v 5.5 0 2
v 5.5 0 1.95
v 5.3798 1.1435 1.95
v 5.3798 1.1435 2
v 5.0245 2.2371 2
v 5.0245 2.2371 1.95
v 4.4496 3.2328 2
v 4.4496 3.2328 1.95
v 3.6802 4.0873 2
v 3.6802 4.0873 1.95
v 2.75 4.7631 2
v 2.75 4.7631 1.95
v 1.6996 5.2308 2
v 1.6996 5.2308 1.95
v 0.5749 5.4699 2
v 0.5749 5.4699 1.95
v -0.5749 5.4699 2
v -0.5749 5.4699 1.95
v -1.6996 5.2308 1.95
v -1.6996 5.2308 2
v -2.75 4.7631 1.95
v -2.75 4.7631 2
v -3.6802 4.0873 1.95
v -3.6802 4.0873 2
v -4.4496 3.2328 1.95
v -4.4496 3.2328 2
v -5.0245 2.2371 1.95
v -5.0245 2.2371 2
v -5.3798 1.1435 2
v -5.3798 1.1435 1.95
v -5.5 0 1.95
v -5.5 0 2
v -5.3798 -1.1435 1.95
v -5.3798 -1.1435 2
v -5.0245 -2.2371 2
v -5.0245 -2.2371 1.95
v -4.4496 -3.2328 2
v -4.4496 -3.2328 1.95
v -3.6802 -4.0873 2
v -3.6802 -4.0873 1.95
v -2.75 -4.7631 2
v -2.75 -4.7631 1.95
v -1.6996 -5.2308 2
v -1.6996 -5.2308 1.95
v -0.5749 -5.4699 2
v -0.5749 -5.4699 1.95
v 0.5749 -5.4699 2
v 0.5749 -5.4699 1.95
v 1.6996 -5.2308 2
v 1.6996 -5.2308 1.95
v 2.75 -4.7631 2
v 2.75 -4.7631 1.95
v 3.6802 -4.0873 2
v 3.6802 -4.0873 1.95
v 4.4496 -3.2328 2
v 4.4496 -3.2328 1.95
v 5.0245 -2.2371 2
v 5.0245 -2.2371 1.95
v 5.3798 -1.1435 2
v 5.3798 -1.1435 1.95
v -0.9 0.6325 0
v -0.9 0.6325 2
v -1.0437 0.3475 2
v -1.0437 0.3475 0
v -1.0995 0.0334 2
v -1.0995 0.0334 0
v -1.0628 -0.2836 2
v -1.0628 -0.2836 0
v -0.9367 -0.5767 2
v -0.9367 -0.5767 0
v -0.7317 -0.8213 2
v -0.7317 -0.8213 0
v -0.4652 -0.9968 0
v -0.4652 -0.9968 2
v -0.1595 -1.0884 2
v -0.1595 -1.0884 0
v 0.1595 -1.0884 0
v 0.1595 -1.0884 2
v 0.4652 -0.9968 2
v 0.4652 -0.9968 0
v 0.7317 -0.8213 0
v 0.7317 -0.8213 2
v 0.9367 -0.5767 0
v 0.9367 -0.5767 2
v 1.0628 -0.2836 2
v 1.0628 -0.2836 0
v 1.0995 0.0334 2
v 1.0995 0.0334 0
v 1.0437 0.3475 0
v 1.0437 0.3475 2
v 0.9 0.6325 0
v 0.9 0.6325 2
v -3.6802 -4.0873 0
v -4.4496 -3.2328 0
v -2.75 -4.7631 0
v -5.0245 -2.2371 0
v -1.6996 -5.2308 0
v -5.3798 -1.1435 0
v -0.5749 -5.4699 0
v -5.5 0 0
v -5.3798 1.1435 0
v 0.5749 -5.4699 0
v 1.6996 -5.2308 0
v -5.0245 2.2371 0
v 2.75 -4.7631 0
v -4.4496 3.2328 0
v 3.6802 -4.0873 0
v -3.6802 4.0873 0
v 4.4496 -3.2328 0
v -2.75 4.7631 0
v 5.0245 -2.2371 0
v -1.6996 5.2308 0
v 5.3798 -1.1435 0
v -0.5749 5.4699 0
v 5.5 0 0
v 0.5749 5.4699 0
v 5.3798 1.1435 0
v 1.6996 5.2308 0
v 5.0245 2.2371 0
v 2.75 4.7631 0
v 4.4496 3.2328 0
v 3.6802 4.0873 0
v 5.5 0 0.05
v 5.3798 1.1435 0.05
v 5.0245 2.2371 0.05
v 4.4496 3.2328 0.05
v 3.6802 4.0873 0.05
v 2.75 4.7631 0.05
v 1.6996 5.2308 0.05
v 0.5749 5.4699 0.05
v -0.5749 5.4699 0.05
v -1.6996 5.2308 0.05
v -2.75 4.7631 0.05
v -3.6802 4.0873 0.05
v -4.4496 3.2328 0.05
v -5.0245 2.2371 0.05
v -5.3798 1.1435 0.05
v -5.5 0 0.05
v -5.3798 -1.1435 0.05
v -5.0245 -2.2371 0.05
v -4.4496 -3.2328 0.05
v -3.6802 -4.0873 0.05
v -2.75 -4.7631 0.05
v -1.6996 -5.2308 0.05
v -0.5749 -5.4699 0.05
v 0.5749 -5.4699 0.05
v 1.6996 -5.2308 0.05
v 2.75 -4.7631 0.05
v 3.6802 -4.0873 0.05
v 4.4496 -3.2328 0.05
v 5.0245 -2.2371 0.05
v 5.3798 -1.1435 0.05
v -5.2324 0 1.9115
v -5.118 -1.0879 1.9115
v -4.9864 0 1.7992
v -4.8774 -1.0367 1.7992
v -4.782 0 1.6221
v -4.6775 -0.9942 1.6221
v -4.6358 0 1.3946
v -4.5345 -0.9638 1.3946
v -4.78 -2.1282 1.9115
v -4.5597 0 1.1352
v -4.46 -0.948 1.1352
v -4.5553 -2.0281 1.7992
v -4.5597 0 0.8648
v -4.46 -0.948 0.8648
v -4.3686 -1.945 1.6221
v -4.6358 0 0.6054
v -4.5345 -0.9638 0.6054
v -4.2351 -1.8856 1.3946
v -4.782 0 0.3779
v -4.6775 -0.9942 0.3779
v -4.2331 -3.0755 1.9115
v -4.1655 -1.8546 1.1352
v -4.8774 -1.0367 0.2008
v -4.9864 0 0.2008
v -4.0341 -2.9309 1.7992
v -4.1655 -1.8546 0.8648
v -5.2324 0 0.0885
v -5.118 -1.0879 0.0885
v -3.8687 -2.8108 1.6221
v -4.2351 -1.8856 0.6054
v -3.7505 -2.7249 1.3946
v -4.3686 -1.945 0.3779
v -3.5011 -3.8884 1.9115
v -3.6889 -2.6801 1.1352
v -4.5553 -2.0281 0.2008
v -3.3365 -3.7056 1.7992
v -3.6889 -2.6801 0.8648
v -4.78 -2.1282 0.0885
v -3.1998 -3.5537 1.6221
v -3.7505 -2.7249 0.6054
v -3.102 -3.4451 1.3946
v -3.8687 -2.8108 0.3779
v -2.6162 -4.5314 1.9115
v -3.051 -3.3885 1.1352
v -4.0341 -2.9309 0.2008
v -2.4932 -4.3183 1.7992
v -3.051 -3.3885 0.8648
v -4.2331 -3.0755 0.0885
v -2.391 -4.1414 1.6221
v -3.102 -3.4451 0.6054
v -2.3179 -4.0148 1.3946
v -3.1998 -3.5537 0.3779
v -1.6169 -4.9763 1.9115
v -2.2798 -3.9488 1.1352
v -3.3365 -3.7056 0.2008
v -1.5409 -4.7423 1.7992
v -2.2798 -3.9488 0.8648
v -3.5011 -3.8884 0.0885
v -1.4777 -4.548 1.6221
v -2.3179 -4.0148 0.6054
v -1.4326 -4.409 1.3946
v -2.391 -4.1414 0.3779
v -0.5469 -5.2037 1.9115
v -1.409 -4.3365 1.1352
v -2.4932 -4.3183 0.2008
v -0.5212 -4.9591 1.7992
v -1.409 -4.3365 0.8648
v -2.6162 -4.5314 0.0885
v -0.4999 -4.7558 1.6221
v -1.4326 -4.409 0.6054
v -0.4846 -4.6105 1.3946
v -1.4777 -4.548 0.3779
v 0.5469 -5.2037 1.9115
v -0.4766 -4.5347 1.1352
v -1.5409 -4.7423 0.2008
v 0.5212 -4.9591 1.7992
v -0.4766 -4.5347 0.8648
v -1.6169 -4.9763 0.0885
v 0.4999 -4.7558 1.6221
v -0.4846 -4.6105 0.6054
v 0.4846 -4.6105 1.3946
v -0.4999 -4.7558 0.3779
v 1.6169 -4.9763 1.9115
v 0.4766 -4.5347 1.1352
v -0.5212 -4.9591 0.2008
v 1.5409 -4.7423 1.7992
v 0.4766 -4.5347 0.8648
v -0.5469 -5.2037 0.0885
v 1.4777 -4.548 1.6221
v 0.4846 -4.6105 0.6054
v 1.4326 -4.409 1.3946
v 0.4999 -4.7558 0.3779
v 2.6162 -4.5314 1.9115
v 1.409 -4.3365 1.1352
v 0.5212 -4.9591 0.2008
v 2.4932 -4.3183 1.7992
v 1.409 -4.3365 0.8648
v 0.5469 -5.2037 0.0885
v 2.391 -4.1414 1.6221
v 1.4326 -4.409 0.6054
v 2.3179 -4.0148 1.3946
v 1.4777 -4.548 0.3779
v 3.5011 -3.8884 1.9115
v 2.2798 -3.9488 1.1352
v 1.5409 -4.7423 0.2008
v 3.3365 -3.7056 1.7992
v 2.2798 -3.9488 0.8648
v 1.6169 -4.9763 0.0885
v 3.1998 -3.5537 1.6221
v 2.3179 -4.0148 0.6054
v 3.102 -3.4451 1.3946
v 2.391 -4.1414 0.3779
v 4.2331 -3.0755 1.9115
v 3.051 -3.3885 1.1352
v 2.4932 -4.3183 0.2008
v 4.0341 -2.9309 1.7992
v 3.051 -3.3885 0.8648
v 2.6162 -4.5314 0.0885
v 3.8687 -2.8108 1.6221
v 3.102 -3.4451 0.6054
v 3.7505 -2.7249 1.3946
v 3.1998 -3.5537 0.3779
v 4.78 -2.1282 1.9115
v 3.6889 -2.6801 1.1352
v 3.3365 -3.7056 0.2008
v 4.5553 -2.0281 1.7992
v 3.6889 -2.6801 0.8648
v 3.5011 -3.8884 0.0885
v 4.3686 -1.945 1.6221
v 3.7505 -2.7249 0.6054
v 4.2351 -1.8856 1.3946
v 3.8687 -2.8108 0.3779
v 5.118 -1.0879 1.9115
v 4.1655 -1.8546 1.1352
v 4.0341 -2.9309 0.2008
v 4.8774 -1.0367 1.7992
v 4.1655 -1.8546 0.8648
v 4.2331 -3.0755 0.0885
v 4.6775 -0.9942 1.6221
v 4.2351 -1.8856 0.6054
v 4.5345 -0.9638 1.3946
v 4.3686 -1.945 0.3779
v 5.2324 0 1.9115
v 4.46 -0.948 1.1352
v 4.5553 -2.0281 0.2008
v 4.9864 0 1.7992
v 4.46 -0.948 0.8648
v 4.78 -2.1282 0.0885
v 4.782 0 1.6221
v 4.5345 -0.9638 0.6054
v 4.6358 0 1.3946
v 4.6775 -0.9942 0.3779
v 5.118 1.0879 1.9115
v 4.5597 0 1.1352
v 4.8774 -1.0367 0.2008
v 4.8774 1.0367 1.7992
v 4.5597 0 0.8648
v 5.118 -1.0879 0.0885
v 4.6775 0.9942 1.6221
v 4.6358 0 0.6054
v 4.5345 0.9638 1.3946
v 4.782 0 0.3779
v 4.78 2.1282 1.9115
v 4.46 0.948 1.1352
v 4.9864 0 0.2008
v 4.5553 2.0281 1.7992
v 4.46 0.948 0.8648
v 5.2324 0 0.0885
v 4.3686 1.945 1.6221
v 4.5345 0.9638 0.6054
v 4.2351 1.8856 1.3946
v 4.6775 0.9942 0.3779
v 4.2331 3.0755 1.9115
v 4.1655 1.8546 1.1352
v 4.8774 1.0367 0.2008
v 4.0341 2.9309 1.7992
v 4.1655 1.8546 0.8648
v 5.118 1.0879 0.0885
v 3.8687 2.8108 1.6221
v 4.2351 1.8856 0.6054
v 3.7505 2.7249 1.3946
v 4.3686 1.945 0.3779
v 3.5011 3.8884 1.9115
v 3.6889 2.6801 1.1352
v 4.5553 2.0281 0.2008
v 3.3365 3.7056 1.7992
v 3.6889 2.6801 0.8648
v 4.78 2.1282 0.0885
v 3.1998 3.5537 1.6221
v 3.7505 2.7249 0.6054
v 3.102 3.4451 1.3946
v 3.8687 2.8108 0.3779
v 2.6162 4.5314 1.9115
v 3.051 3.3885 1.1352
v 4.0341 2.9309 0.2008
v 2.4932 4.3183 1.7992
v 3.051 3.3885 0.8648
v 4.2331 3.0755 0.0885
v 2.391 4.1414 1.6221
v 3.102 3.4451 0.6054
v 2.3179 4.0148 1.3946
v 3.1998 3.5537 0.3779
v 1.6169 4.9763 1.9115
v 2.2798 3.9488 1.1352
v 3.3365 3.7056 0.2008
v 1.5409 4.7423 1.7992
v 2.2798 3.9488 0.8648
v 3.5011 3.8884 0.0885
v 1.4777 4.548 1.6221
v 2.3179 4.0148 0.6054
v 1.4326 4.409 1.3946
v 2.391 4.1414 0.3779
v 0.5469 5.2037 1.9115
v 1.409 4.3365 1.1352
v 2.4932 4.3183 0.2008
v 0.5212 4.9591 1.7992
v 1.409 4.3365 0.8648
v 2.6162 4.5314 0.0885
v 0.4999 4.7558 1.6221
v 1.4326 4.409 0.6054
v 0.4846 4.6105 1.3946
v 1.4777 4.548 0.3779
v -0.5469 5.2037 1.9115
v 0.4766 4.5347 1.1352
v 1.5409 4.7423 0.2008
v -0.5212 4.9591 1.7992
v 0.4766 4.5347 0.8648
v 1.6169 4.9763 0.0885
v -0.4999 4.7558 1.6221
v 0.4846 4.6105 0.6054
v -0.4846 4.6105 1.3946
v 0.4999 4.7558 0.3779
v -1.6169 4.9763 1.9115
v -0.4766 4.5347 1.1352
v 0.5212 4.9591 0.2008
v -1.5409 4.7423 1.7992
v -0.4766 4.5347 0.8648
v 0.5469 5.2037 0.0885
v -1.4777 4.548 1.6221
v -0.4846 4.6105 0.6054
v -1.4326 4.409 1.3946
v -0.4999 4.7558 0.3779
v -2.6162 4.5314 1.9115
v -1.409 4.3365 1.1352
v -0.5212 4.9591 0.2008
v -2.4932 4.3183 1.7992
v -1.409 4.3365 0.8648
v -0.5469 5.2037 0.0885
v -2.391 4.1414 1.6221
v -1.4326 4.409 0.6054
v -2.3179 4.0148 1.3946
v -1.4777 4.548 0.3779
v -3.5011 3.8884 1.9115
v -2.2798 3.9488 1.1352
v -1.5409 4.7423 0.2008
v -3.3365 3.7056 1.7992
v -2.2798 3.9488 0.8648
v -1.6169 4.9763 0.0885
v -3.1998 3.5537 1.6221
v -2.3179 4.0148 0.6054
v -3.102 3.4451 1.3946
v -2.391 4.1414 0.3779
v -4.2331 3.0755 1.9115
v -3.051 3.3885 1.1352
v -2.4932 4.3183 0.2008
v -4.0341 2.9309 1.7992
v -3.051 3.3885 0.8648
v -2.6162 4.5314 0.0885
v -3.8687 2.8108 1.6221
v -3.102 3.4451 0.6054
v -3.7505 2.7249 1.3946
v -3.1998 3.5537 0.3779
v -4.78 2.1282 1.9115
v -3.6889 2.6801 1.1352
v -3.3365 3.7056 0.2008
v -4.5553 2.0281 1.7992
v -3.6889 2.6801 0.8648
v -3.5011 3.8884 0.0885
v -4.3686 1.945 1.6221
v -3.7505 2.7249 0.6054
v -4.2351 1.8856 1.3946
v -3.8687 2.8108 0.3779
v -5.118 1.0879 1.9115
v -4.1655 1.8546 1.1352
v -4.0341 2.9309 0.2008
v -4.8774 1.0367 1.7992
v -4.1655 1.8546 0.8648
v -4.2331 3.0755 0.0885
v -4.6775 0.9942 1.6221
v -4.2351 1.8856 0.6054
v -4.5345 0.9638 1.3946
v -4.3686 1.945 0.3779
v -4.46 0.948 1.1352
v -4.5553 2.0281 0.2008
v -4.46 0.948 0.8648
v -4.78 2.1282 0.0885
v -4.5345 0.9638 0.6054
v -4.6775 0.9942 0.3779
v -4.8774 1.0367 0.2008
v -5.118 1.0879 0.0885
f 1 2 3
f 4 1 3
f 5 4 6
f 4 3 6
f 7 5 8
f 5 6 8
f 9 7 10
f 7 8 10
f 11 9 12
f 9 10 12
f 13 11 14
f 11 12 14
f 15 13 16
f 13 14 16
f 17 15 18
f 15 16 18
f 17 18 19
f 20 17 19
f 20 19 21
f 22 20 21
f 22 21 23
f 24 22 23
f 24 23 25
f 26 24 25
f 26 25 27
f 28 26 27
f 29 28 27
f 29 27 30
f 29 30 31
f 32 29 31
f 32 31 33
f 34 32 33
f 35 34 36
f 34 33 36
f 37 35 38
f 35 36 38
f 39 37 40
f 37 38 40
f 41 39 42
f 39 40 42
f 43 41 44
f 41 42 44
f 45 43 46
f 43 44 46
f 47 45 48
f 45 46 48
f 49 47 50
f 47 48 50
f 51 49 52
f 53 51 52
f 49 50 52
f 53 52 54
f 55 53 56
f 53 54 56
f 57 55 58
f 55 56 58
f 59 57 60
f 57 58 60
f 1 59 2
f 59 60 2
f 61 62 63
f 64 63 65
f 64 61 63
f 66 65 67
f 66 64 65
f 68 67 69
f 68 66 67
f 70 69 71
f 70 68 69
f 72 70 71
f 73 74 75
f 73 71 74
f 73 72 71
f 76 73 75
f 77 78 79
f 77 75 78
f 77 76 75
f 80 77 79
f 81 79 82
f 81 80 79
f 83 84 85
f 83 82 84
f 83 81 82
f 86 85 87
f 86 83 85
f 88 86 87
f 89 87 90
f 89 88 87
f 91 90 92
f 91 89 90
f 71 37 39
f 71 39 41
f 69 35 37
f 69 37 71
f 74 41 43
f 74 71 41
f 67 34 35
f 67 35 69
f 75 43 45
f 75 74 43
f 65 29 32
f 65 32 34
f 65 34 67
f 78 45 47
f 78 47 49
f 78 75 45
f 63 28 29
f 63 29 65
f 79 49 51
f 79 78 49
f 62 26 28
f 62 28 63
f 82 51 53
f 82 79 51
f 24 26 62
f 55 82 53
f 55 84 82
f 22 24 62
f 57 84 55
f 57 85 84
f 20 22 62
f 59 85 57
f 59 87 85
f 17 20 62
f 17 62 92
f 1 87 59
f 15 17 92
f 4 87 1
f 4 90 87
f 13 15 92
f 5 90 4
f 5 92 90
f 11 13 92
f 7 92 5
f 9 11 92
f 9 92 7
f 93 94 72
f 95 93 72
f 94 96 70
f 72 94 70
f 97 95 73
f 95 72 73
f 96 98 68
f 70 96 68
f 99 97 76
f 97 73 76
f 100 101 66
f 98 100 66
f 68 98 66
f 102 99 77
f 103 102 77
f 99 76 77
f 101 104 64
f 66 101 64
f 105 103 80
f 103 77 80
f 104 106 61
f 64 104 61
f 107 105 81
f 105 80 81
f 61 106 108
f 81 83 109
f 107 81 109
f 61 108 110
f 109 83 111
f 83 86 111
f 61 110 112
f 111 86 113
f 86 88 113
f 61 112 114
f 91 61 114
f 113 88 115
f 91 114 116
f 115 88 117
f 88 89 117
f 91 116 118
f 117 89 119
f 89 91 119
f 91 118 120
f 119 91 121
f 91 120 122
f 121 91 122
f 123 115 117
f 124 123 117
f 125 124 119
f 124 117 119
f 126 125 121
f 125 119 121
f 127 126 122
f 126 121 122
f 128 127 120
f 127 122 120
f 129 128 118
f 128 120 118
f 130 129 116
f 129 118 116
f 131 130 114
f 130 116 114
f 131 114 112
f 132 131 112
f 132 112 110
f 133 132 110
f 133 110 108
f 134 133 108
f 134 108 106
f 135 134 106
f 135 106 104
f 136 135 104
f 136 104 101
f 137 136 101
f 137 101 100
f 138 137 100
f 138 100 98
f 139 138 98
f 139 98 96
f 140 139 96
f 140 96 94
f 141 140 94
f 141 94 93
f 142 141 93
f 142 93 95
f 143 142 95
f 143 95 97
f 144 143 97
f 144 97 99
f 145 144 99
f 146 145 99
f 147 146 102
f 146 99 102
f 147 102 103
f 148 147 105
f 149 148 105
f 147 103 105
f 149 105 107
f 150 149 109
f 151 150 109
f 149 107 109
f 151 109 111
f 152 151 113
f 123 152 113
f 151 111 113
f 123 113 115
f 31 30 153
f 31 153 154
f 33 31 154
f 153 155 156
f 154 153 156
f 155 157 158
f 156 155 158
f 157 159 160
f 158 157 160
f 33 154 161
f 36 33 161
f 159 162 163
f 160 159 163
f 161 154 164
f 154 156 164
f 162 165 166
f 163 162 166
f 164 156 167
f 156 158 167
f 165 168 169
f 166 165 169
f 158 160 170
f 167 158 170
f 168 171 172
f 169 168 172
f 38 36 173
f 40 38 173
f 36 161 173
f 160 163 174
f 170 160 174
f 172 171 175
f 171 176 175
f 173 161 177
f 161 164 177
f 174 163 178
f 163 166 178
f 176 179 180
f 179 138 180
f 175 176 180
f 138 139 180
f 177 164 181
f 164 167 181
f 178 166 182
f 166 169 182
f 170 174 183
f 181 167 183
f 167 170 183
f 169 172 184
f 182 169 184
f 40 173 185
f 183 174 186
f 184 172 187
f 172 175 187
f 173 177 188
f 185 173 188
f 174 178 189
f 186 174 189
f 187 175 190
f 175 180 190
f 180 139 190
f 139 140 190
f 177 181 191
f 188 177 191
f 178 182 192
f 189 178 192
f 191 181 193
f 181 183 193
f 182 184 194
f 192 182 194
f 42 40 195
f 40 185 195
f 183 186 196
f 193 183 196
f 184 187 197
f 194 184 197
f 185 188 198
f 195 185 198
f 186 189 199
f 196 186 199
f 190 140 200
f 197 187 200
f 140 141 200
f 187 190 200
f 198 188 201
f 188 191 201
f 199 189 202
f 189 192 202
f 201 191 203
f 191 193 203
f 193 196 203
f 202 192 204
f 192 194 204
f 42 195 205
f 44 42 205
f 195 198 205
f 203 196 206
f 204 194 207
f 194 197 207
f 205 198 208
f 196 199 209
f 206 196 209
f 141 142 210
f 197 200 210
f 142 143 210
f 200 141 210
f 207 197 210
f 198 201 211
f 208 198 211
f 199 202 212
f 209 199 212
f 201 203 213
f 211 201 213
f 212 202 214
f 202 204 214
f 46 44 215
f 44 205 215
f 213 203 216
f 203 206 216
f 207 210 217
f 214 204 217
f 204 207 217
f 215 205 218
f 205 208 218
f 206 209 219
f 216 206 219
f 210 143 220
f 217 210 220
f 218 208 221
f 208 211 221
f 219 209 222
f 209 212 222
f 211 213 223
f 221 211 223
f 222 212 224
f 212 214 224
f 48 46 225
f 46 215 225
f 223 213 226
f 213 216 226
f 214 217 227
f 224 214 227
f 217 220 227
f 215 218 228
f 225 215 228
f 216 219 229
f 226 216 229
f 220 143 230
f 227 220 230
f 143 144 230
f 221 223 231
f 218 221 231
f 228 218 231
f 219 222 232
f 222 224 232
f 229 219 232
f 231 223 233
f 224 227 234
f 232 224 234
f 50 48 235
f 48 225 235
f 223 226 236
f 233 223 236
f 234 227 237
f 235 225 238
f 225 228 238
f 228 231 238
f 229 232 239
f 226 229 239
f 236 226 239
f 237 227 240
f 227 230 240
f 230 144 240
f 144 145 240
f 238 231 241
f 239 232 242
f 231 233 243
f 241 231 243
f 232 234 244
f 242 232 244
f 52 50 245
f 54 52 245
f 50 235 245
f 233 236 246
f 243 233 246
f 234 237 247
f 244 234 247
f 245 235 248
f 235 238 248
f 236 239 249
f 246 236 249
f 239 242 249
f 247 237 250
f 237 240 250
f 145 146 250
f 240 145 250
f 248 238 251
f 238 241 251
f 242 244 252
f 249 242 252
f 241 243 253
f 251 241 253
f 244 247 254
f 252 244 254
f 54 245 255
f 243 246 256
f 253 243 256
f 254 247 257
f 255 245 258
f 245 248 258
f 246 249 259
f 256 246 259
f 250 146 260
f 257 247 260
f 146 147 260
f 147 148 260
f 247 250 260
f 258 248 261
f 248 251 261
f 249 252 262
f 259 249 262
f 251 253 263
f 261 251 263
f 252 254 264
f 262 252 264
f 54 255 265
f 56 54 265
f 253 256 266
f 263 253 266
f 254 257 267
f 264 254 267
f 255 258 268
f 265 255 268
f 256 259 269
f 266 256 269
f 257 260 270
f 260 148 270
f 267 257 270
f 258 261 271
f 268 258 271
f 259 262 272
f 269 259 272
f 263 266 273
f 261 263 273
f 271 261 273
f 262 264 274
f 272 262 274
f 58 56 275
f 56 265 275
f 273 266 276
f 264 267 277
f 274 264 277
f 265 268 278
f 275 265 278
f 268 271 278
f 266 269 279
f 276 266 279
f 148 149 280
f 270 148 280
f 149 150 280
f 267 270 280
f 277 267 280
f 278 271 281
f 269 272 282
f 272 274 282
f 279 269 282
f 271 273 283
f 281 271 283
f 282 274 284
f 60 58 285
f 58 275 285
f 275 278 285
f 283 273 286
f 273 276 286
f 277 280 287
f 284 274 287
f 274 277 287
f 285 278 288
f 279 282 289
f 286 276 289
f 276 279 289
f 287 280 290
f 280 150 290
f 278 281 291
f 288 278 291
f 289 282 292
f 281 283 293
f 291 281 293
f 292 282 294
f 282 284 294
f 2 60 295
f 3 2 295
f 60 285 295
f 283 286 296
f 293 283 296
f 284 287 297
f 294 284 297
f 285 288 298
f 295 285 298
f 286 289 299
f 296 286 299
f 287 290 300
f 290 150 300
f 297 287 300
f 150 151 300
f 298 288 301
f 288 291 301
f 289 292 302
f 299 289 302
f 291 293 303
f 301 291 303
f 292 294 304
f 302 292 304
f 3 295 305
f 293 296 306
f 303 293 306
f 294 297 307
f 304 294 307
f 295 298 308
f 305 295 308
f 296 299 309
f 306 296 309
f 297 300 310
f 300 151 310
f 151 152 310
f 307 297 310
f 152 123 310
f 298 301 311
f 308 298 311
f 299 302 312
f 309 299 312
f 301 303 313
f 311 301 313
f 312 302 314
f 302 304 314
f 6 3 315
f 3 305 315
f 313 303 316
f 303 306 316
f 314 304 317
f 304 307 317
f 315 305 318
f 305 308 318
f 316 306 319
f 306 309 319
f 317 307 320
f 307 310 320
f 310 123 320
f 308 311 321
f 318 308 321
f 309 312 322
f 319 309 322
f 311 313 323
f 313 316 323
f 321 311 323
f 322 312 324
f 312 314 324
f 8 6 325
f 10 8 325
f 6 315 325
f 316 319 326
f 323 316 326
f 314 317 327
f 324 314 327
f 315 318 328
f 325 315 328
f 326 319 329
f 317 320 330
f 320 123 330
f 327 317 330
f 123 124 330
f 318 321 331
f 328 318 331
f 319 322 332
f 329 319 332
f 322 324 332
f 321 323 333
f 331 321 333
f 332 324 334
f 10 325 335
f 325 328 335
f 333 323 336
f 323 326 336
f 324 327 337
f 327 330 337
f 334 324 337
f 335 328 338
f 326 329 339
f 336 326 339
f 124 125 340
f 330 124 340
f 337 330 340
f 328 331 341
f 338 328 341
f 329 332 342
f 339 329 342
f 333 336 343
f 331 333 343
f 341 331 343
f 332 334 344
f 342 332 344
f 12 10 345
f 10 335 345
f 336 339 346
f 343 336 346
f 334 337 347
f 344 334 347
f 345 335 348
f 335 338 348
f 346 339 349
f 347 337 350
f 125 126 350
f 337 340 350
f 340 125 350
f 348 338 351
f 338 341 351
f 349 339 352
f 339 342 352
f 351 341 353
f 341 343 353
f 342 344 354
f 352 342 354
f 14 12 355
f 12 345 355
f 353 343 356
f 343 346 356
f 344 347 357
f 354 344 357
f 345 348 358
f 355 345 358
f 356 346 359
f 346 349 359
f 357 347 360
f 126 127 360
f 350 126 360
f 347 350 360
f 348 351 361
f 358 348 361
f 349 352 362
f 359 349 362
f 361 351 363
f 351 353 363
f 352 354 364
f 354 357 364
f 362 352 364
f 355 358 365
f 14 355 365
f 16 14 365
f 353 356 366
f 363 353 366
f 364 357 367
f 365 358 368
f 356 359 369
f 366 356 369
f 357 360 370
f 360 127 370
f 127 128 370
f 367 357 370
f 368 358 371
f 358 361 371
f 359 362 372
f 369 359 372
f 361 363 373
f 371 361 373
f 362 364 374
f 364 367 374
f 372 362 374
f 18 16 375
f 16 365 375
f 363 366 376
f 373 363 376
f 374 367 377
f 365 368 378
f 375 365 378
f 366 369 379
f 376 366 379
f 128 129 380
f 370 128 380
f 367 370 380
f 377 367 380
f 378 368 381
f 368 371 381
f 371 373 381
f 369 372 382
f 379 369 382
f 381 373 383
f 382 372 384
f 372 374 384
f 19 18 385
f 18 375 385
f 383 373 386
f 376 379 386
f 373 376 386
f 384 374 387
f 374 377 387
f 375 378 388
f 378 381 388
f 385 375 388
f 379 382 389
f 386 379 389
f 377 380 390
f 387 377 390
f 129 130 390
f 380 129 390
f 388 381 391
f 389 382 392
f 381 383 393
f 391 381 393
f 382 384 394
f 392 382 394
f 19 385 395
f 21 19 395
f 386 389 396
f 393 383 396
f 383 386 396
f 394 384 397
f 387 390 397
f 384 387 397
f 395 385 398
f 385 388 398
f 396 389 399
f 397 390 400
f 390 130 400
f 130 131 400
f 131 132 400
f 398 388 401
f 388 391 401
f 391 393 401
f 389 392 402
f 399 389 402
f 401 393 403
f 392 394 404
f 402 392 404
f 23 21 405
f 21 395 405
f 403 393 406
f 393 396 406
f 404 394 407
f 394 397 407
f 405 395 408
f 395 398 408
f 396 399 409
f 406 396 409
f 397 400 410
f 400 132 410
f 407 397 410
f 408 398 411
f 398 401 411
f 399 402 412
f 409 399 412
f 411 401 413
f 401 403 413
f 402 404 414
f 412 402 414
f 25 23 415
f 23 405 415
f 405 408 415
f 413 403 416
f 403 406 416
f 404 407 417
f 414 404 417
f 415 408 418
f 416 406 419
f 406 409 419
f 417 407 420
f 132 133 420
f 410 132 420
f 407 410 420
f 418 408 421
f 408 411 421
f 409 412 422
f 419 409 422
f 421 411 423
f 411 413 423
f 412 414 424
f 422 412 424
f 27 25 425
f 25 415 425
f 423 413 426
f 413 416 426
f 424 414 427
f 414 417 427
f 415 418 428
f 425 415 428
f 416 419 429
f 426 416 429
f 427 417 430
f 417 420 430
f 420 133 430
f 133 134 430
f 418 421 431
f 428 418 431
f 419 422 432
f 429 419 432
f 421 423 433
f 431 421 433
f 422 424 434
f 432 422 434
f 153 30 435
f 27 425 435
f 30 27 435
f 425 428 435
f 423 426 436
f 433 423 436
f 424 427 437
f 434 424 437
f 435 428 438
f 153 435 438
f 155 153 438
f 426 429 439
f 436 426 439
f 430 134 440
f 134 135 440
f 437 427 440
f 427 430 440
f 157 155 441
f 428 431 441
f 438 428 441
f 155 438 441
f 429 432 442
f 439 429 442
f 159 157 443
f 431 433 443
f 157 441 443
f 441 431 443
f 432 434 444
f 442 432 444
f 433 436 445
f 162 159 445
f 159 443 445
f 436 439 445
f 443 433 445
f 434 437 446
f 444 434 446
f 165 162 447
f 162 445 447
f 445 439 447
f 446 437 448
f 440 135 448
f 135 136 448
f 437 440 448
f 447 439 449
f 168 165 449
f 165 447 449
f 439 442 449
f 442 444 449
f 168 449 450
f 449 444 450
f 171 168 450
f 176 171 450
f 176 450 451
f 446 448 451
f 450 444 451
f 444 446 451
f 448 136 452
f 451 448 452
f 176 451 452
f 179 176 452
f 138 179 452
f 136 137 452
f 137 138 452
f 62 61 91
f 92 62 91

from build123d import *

# Parameters (mm, degrees)
SKETCH1_R           = 5.5
SKETCH1_R_2         = 1.1
BOSS_EXTRUDE1_DEPTH = 2
BOSS_EXTRUDE3_START = -2
BOSS_EXTRUDE3_DEPTH = 2


with BuildPart() as part:
    # Sketch1 → Boss-Extrude1 (new body)
    with BuildSketch(Plane.XY):
        Circle(SKETCH1_R)
        Circle(SKETCH1_R_2, mode=Mode.SUBTRACT)
    extrude(amount=BOSS_EXTRUDE1_DEPTH)

    # Sketch2 → Boss-Extrude3 (add)
    with BuildSketch(Plane.XY.offset(2).offset(BOSS_EXTRUDE3_START)):
        with BuildLine():
            Line((-0.9, 0.632455532), (0.9, 0.632455532))
            ThreePointArc((0.9, 0.632455532), (0, 1.1), (-0.9, 0.632455532))
        make_face()
    extrude(amount=BOSS_EXTRUDE3_DEPTH)

    # Sketch3 → Cut-Revolve1 (revolve, cut)
    with BuildSketch(Plane(origin=(0, 0, 0), x_dir=(0, 0, -1), z_dir=(1, 0, 0)), mode=Mode.PRIVATE) as cut_revolve1_sk:
        with BuildLine():
            Line((-0.05, 5.5), (-1.95, 5.5))
            ThreePointArc((-1.95, 5.5), (-1, 4.55), (-0.05, 5.5))
        make_face()
    revolve(cut_revolve1_sk.sketch.rotate(Axis((0, 0, -0.1), (0, 0, 1)), 90), axis=Axis((0, 0, -0.1), (0, 0, 1)), mode=Mode.SUBTRACT)


solid = part.part
